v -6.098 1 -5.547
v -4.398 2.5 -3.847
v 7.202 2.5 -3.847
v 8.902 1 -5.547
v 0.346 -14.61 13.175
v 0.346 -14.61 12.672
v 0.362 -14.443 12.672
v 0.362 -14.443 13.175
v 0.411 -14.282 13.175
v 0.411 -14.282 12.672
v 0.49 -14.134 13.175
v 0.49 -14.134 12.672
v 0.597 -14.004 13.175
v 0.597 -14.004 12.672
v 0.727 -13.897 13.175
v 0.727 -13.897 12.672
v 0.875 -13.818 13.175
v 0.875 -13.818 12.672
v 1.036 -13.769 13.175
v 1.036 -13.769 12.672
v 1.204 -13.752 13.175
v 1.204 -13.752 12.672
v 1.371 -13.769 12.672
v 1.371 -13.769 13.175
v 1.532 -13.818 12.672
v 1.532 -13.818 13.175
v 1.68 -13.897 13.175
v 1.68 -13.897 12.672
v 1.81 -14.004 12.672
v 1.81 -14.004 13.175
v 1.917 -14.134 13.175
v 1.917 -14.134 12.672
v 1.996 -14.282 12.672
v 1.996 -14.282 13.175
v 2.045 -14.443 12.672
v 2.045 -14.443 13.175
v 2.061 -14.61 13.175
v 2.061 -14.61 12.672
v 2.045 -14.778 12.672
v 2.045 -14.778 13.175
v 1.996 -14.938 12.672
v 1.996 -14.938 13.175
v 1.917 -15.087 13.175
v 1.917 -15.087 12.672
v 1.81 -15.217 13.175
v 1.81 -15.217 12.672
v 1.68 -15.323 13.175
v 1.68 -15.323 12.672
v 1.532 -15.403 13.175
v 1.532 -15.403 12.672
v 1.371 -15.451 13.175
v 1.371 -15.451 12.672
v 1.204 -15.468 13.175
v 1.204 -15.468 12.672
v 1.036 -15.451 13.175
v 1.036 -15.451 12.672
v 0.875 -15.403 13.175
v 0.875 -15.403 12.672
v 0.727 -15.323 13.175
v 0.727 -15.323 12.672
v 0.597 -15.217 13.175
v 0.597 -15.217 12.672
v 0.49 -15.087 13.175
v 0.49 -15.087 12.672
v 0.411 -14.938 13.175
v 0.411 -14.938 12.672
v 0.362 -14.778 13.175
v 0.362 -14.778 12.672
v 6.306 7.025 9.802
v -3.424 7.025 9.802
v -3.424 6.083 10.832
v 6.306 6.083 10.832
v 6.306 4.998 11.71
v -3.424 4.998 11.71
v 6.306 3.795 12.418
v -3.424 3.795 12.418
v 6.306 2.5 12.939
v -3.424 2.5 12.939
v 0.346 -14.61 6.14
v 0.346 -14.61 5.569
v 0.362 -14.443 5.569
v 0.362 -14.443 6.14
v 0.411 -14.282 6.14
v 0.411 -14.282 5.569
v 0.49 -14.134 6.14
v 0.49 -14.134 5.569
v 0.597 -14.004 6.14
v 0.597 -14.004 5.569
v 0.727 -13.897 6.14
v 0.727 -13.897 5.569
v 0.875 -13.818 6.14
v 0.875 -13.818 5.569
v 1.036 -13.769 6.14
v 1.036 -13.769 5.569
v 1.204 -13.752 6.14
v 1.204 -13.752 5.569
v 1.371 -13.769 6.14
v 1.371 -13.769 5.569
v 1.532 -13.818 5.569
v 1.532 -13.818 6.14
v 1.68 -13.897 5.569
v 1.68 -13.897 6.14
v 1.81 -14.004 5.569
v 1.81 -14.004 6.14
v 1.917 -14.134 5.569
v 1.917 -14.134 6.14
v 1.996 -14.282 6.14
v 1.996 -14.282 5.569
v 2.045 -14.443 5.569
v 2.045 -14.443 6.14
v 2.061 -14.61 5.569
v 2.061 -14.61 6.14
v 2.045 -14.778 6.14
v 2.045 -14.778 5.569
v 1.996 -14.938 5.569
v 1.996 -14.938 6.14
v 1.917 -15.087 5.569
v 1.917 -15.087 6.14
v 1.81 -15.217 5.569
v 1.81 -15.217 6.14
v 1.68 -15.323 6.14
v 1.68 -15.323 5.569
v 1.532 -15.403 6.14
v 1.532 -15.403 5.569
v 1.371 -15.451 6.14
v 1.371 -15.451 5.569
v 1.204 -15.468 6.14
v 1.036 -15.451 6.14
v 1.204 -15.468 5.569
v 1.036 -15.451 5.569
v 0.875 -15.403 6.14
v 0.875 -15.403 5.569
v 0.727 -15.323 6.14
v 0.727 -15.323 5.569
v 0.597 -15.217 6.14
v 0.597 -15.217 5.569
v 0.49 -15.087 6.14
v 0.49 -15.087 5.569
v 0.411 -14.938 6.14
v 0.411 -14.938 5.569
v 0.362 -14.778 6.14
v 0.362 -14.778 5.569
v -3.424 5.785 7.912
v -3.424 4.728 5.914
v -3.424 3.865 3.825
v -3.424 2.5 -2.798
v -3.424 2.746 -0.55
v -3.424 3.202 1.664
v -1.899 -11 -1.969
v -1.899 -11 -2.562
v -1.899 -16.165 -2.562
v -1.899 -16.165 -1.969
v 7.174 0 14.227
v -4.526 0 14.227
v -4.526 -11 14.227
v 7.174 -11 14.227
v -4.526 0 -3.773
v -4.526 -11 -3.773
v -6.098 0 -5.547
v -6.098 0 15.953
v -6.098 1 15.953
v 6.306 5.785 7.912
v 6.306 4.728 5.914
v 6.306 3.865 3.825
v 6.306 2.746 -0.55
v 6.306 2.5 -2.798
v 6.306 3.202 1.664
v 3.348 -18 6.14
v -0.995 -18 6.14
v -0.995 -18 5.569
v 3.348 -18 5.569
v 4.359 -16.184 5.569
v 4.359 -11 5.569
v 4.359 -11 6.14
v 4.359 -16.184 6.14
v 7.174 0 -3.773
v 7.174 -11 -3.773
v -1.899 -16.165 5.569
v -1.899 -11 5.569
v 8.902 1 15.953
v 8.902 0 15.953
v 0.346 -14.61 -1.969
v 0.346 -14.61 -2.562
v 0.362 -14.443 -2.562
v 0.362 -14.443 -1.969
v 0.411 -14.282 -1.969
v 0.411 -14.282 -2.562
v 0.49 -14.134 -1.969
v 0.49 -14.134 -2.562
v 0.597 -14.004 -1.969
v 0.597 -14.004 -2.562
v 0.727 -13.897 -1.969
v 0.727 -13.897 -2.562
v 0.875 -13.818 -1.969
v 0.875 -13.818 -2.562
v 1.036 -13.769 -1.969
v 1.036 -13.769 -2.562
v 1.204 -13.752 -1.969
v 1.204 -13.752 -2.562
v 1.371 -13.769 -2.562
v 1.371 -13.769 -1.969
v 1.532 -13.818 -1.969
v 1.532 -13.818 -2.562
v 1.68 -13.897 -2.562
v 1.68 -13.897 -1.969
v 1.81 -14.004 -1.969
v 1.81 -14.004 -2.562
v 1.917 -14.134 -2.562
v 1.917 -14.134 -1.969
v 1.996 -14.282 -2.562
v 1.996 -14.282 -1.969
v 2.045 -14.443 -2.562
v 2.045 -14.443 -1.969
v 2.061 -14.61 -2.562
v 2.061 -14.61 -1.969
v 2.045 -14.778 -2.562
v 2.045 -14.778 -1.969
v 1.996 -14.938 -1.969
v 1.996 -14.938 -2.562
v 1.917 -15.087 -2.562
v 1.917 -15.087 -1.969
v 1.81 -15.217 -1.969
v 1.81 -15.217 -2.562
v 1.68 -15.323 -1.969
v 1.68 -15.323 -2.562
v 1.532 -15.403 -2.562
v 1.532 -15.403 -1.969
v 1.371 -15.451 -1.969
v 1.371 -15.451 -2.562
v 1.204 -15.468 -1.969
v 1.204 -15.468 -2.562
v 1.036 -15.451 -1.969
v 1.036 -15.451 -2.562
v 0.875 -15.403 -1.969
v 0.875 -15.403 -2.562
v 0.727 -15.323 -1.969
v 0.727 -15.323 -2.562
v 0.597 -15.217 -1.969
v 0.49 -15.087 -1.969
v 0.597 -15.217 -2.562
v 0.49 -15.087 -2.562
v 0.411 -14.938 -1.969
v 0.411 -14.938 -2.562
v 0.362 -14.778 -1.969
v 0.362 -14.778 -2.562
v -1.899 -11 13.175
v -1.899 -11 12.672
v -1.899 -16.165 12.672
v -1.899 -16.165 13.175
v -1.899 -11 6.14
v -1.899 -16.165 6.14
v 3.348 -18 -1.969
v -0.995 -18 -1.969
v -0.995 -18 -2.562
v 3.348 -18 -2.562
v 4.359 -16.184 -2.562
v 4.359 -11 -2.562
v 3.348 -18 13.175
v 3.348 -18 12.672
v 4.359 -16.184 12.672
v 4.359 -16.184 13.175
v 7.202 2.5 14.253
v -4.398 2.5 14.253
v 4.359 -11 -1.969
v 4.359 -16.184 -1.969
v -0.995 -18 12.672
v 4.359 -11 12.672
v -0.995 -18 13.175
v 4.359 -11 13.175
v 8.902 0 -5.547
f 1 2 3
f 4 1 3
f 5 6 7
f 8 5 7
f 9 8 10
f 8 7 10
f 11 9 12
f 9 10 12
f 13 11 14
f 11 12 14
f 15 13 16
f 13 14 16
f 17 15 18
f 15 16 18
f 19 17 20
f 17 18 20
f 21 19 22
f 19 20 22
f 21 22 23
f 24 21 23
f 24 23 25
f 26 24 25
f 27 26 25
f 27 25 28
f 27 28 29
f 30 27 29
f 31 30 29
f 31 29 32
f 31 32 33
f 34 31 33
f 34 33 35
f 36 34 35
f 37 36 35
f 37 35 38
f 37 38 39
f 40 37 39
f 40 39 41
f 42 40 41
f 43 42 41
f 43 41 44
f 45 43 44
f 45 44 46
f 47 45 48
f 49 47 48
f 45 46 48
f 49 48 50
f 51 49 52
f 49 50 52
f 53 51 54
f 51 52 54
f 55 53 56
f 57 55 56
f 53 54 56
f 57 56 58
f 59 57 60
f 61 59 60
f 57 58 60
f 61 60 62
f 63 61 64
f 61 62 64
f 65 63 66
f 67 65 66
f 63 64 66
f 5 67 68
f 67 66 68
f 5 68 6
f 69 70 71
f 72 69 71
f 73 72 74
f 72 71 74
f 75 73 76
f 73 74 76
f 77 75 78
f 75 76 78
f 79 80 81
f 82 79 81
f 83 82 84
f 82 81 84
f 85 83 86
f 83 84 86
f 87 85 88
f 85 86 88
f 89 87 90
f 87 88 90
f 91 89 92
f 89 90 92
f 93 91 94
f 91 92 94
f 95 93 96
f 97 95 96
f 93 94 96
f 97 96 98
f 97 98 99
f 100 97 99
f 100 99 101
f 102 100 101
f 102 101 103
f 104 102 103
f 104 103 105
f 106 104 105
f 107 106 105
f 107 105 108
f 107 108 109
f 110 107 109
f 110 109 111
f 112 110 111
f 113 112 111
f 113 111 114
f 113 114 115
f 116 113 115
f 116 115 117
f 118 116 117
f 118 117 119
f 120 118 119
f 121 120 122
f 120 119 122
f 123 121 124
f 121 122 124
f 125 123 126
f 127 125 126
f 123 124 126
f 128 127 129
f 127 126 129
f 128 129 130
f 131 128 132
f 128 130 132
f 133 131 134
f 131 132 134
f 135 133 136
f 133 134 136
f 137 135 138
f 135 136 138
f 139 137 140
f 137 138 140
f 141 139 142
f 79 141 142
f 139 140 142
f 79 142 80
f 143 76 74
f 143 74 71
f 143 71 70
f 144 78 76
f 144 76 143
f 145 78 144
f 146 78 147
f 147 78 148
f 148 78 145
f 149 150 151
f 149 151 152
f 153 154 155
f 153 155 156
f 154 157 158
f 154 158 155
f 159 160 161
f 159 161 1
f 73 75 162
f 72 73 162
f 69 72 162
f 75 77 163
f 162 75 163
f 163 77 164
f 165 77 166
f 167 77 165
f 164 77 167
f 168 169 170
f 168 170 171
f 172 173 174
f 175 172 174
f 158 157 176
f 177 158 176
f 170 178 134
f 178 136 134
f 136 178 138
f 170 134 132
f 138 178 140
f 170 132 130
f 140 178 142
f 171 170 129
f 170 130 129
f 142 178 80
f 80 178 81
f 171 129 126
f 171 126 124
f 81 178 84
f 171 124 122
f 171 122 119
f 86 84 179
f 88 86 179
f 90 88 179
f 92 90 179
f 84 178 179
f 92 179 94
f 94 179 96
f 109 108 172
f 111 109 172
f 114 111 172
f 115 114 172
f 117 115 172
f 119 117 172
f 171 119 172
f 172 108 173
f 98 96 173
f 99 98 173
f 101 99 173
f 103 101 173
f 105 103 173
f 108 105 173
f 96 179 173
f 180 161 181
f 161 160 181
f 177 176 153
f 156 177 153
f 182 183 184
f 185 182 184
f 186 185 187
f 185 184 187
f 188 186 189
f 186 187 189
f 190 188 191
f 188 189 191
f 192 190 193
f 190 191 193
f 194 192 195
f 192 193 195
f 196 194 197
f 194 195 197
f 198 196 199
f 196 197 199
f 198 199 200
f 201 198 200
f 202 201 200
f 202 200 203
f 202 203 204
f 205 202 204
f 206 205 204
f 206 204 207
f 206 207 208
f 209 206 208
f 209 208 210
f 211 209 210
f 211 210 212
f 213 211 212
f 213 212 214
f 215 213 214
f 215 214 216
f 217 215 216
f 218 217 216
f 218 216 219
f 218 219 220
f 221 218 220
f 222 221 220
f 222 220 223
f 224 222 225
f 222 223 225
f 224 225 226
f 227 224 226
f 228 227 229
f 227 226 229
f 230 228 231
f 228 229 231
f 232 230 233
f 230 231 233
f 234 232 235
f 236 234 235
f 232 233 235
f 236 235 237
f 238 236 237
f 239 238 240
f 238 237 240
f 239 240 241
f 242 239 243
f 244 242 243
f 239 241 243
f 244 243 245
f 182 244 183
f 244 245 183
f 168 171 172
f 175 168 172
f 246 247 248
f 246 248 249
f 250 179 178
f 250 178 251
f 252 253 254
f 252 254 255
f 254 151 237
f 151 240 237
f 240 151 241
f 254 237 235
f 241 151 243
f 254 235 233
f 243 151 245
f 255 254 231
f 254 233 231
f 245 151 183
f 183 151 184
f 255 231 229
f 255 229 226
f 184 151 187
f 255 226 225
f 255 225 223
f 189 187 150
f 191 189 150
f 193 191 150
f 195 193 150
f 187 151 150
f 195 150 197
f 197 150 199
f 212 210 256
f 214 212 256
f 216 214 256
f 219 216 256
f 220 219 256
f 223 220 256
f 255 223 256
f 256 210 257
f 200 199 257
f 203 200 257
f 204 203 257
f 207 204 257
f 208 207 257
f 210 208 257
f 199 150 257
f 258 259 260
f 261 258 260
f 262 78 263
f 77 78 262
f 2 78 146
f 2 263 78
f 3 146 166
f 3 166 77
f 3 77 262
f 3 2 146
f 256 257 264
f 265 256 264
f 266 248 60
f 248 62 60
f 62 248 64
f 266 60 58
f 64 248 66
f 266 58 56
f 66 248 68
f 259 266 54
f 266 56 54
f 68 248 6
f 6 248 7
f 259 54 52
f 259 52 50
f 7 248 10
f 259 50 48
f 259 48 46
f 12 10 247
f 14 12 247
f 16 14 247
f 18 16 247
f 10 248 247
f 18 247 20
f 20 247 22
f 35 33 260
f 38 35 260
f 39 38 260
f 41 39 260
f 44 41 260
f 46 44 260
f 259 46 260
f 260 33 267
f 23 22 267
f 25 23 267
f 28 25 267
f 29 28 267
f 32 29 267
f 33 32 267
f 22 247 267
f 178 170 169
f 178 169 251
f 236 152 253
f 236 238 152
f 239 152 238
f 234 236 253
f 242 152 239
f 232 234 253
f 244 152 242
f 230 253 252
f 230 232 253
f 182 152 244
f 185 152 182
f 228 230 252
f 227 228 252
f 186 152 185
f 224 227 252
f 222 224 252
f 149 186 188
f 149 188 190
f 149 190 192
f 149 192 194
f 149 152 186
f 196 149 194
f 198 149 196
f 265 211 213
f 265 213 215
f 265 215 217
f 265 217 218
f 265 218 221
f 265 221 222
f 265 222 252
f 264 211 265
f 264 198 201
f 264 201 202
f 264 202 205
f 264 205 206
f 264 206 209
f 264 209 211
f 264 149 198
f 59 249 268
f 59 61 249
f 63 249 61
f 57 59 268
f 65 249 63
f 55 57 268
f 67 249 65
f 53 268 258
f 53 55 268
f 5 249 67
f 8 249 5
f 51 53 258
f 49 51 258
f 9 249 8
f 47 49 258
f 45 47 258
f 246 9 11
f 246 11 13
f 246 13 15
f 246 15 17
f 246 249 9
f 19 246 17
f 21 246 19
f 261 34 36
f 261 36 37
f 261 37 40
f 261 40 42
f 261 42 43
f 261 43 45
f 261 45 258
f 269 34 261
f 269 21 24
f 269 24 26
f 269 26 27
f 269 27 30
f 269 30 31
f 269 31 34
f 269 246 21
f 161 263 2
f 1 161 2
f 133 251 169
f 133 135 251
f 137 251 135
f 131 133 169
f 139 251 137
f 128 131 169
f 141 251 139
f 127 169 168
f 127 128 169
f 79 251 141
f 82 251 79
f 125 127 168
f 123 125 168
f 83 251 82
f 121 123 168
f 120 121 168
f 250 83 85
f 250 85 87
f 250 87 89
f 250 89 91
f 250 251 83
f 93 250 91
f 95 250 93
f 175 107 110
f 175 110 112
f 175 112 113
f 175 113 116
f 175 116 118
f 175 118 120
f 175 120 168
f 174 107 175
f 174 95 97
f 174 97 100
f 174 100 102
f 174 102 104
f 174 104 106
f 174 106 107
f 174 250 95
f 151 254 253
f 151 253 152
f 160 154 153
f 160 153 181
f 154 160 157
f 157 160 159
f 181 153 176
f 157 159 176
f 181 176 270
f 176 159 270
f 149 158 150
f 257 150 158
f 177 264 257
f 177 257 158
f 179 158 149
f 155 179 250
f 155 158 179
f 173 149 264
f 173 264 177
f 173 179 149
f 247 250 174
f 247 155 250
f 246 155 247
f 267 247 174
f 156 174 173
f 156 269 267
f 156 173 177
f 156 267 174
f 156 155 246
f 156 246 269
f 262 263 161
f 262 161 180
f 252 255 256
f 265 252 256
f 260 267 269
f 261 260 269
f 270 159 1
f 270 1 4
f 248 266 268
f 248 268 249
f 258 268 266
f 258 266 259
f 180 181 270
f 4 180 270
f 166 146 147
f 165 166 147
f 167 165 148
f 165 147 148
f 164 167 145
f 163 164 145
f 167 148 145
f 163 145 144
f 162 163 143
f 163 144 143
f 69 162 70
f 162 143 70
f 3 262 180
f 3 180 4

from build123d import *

# Parameters (mm, degrees)
SKETCH1_W             = 15
SKETCH1_H             = 21.5
BOSS_EXTRUDE1_DEPTH   = 2.5
CHAMFER1_SIZE         = 1.5
CHAMFER1_SIZE2        = 1.7
CHAMFER1_PART_2_SIZE  = 1.5
CHAMFER1_PART_2_SIZE2 = 1.7
CHAMFER1_PART_3_SIZE  = 1.5
CHAMFER1_PART_3_SIZE2 = 1.7
CHAMFER1_PART_4_SIZE  = 1.5
CHAMFER1_PART_4_SIZE2 = 1.7
SKETCH3_W             = 11.7
SKETCH3_H             = 18
BOSS_EXTRUDE2_DEPTH   = 11
SKETCH4_W             = 6.25827791
SKETCH4_H             = 0.502489468
SKETCH4_H_2           = 0.571010759
SKETCH4_H_3           = 0.593851189
BOSS_EXTRUDE3_DEPTH   = 7
SKETCH5_R             = 0.857772401
CUT_EXTRUDE1_DEPTH    = 22
BOSS_EXTRUDE4_DEPTH   = 22
SKETCH8_W             = 6.303958771
SKETCH8_H             = 16.703004391
SKETCH8_W_2           = 12.882002706
SKETCH8_H_2           = 17.251174719
CUT_EXTRUDE2_DEPTH    = 16


with BuildPart() as part:
    # Sketch1 → Boss-Extrude1 (new body)
    with BuildSketch(Plane(origin=(0, 0, 0), x_dir=(1, 0, 0), z_dir=(0, 1, 0))):
        with Locations((1.401590457, -5.203280318)):
            Rectangle(SKETCH1_W, SKETCH1_H)
    extrude(amount=BOSS_EXTRUDE1_DEPTH)

    # Chamfer1
    chamfer1_edges = [part.edges().sort_by_distance(p)[0] for p in [
        (8.901590457, 2.5, 5.203280318),
    ]]
    chamfer1_side = [part.faces().sort_by_distance(p)[0] for p in [
        (8.901590457, 1.25, 5.203280318),
    ]]
    chamfer(chamfer1_edges, length=CHAMFER1_SIZE, length2=CHAMFER1_SIZE2, reference=chamfer1_side[0])

    # Chamfer1 part 2
    chamfer1_part_2_edges = [part.edges().sort_by_distance(p)[0] for p in [
        (1.401590457, 2.5, -5.546719682),
    ]]
    chamfer1_part_2_side = [part.faces().sort_by_distance(p)[0] for p in [
        (1.401590457, 1.25, -5.546719682),
    ]]
    chamfer(chamfer1_part_2_edges, length=CHAMFER1_PART_2_SIZE, length2=CHAMFER1_PART_2_SIZE2, reference=chamfer1_part_2_side[0])

    # Chamfer1 part 3
    chamfer1_part_3_edges = [part.edges().sort_by_distance(p)[0] for p in [
        (-6.098409543, 2.5, 5.203280318),
    ]]
    chamfer1_part_3_side = [part.faces().sort_by_distance(p)[0] for p in [
        (-6.098409543, 1.25, 5.203280318),
    ]]
    chamfer(chamfer1_part_3_edges, length=CHAMFER1_PART_3_SIZE, length2=CHAMFER1_PART_3_SIZE2, reference=chamfer1_part_3_side[0])

    # Chamfer1 part 4
    chamfer1_part_4_edges = [part.edges().sort_by_distance(p)[0] for p in [
        (1.401590457, 2.5, 15.953280318),
    ]]
    chamfer1_part_4_side = [part.faces().sort_by_distance(p)[0] for p in [
        (1.401590457, 1.25, 15.953280318),
    ]]
    chamfer(chamfer1_part_4_edges, length=CHAMFER1_PART_4_SIZE, length2=CHAMFER1_PART_4_SIZE2, reference=chamfer1_part_4_side[0])

    # Sketch3 → Boss-Extrude2 (add)
    with BuildSketch(Plane.XZ):
        with Locations((1.324498787, 5.226991199)):
            Rectangle(SKETCH3_W, SKETCH3_H)
    extrude(amount=BOSS_EXTRUDE2_DEPTH)

    # Sketch4 → Boss-Extrude3 (add)
    with BuildSketch(Plane.XZ.offset(11)):
        with Locations((1.23028723, 12.923345769)):
            Rectangle(SKETCH4_W, SKETCH4_H)
        with Locations((1.23028723, 5.854232582)):
            Rectangle(SKETCH4_W, SKETCH4_H_2)
        with Locations((1.23028723, -2.265540399)):
            Rectangle(SKETCH4_W, SKETCH4_H_3)
    extrude(amount=BOSS_EXTRUDE3_DEPTH)

    # Sketch5 → Cut-Extrude1 (cut)
    with BuildSketch(Plane(origin=(0, 0, -2.562465994), x_dir=(-1, 0, 0), z_dir=(0, 0, -1))):
        with Locations((-1.203624554, -14.610197603)):
            Circle(SKETCH5_R)
        Polygon((-3.009226286, -18.607426263), (-4.889542572, -15.232818889), (-5.175948364, -18.482902006), align=None)
        Polygon((0.726501434, -18.545164135), (2.357769206, -15.232818889), (2.818508958, -18.545164135), align=None)
    extrude(amount=-CUT_EXTRUDE1_DEPTH, mode=Mode.SUBTRACT)

    # Sketch7 → Boss-Extrude4 (add)
    with BuildSketch(Plane.ZY.offset(6.098409543)):
        with BuildLine():
            Line((12.938985356, 2.5), (-2.797520118, 2.5))
            ThreePointArc((-2.797520118, 2.5), (3.824713578, 3.86461935), (9.802054281, 7.02492997))
            ThreePointArc((9.802054281, 7.02492997), (11.710383364, 4.998077143), (12.938985356, 2.5))
        make_face()
    extrude(amount=-BOSS_EXTRUDE4_DEPTH)

    # Sketch8 → Cut-Extrude2 (cut)
    with BuildSketch(Plane(origin=(0, 2.5, 0), x_dir=(1, 0, 0), z_dir=(0, 1, 0))):
        with Locations((-6.575725783, -5.553982078)):
            Rectangle(SKETCH8_W, SKETCH8_H)
        with Locations((12.747278275, -5.828067242)):
            Rectangle(SKETCH8_W_2, SKETCH8_H_2)
    extrude(amount=CUT_EXTRUDE2_DEPTH, mode=Mode.SUBTRACT)


solid = part.part
